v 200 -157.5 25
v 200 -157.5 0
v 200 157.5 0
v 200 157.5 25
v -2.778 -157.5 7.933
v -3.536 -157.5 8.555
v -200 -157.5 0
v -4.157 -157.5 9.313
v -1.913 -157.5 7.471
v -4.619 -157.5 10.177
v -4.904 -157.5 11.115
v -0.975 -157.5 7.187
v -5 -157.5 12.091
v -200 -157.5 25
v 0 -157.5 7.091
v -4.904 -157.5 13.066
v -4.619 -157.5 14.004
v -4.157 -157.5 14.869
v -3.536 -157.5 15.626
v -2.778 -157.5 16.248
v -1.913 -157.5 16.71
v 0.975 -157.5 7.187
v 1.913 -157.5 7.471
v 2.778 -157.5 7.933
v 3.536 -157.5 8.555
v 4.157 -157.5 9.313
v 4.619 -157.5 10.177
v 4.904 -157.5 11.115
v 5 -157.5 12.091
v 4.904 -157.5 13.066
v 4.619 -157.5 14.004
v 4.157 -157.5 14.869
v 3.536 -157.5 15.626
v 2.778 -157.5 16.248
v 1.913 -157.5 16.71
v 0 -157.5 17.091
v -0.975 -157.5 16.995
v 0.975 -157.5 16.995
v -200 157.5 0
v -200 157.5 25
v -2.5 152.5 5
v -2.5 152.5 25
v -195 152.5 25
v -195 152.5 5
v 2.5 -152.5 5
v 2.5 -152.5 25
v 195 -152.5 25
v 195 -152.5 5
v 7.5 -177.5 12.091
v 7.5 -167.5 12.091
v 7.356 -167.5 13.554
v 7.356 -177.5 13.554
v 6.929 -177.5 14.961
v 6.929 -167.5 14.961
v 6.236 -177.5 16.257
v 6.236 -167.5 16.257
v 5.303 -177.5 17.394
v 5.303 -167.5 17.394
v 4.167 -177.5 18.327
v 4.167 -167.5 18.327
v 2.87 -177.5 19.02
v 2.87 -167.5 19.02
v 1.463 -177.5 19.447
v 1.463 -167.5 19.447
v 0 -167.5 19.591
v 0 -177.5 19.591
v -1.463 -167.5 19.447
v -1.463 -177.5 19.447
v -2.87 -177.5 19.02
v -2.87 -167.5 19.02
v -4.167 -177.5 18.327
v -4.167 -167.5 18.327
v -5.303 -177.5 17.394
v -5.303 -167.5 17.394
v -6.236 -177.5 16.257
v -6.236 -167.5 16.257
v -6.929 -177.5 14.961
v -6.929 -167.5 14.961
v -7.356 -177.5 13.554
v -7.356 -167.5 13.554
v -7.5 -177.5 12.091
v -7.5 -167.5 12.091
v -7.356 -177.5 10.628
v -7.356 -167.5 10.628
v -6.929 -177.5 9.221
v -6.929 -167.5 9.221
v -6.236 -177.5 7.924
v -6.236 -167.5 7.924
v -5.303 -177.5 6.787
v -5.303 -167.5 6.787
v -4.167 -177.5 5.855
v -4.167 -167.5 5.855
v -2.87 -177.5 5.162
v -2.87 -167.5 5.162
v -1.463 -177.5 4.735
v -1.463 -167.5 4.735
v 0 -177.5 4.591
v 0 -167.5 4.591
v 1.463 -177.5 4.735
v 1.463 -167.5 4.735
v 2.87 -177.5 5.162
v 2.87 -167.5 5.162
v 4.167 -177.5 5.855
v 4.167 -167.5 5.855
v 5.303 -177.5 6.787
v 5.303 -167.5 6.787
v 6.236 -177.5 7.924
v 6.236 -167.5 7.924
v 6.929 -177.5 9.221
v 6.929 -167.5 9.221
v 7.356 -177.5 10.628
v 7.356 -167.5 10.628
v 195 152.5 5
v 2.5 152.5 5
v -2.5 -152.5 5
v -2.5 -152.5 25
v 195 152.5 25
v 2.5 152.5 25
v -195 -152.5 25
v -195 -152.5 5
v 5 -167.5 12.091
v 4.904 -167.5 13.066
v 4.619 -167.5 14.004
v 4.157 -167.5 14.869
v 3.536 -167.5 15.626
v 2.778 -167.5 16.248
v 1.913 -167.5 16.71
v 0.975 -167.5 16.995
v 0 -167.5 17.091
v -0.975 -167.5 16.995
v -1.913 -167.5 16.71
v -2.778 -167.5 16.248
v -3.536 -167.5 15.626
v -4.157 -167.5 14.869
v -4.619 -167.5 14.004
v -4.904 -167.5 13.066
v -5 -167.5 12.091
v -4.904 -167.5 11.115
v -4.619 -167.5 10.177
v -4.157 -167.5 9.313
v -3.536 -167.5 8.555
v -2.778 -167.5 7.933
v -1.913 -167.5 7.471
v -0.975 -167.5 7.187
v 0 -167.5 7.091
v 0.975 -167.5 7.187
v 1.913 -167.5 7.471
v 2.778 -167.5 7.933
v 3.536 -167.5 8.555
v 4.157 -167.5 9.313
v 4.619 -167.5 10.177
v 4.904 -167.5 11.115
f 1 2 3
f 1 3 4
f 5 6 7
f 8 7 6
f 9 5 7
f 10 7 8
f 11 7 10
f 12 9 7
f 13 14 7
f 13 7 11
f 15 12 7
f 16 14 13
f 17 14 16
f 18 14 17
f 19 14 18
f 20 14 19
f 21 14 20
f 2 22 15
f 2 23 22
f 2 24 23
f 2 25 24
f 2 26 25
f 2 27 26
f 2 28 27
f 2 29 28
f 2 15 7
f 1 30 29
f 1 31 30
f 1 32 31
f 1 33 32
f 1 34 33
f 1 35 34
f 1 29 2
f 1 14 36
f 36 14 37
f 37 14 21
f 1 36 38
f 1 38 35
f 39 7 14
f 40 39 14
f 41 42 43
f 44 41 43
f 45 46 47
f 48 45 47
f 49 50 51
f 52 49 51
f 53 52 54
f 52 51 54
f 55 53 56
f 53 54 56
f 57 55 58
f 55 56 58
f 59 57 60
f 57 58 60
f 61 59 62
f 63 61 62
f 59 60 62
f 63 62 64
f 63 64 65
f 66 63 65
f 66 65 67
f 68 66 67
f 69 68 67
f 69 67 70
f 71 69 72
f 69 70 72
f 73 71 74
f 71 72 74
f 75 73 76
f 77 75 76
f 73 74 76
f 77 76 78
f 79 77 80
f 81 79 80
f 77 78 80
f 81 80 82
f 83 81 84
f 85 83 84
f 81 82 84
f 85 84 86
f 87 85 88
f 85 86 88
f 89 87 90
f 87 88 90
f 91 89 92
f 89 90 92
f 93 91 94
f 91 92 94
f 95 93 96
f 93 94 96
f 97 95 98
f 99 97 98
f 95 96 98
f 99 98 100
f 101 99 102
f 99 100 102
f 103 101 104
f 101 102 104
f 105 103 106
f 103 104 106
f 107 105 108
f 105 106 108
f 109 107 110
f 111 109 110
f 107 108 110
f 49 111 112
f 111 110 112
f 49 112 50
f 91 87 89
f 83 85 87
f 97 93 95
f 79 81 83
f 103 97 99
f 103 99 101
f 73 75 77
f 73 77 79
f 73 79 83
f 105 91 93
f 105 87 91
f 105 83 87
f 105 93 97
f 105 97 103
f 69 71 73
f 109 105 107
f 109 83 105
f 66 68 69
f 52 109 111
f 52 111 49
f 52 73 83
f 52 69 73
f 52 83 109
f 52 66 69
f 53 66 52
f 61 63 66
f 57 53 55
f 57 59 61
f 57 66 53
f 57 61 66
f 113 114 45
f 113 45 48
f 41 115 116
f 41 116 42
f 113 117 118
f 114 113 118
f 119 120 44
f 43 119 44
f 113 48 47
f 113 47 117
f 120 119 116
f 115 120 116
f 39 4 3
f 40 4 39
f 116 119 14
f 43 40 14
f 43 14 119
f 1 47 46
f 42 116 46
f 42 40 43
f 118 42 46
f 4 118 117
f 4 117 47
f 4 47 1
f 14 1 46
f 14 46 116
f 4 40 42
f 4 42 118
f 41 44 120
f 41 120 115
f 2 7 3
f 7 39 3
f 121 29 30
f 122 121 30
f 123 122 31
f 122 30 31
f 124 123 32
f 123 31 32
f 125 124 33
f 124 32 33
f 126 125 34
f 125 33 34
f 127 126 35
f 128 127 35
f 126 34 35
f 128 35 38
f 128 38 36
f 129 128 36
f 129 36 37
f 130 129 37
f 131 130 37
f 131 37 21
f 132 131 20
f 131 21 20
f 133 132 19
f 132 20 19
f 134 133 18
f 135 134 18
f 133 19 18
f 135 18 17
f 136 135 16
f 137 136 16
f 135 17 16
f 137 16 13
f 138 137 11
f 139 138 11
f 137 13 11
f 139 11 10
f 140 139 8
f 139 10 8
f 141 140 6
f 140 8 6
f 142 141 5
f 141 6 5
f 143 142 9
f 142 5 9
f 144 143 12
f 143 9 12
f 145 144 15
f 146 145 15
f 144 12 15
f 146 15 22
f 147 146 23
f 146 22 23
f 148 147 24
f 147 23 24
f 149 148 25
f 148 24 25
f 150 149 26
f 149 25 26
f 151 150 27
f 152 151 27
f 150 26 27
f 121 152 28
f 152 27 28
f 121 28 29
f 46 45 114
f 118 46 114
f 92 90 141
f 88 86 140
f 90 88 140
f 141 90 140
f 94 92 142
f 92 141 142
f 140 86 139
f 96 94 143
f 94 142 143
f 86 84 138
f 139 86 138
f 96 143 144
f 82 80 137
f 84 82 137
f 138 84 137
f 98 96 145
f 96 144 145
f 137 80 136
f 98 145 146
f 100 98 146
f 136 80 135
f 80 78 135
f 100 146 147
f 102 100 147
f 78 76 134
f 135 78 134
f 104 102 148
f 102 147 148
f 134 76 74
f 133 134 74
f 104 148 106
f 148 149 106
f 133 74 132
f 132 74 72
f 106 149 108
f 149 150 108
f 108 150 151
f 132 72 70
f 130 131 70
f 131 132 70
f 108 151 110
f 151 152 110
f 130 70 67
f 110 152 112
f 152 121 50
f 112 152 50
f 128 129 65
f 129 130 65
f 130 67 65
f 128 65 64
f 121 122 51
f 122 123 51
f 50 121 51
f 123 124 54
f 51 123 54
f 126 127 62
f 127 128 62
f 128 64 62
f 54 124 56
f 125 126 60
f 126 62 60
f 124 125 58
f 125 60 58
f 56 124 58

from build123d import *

# Parameters (mm, degrees)
F0_W      = 38.3663107641
F0_H      = 42.2096475959
F1_DEPTH  = 0.6858
F3_W      = 400
F3_H      = 305
F4_DEPTH  = 5
F5_W      = 5
F5_H      = 305
F6_DEPTH  = 20
F7_W      = 5
F7_H      = 305
F8_DEPTH  = 20
F9_W      = 400
F9_H      = 25
F10_DEPTH = 5
F11_W     = 5
F11_H     = 305
F12_DEPTH = 20
F13_W     = 400
F13_H     = 25
F14_DEPTH = 5
F15_R     = 5
F16_DEPTH = 10
F17_R     = 7.5
F17_R_2   = 5
F18_DEPTH = 10


with BuildPart() as f1:
    # F0 (on Top) → F1 (new body)
    with BuildSketch(Plane.XY):
        with Locations((-14.0401979443, 21.1048237979)):
            Rectangle(F0_W, F0_H)
    extrude(amount=F1_DEPTH)


with BuildPart() as f4:
    # F3 (on Top) → F4 (new body)
    with BuildSketch(Plane.XY):
        Rectangle(F3_W, F3_H)
    extrude(amount=F4_DEPTH)

    # F5 (on face) → F6 (join)
    with BuildSketch(Plane.XY.offset(5)):
        with Locations((-197.5, 0)):
            Rectangle(F5_W, F5_H)
    extrude(amount=F6_DEPTH)

    # F7 (on face) → F8 (join)
    with BuildSketch(Plane.XY.offset(5)):
        with Locations((197.5, 0)):
            Rectangle(F7_W, F7_H)
    extrude(amount=F8_DEPTH)

    # F9 (on face) → F10 (join)
    with BuildSketch(Plane(origin=(0, 152.5, 0), x_dir=(-1, 0, 0), z_dir=(0, 1, 0))):
        with Locations((0, 12.5)):
            Rectangle(F9_W, F9_H)
    extrude(amount=F10_DEPTH)

    # F11 (on face) → F12 (join)
    with BuildSketch(Plane.XY.offset(5)):
        Rectangle(F11_W, F11_H)
    extrude(amount=F12_DEPTH)

    # F13 (on face) → F14 (join)
    with BuildSketch(Plane.XZ.offset(152.5)):
        with Locations((0, 12.5)):
            Rectangle(F13_W, F13_H)
    extrude(amount=F14_DEPTH)

    # F15 (on face) → F16 (join)
    with BuildSketch(Plane.XZ.offset(157.5)):
        with Locations((0, 12.090690434)):
            Circle(F15_R)
    extrude(amount=F16_DEPTH)

    # F17 (on face) → F18 (join)
    with BuildSketch(Plane.XZ.offset(167.5)):
        with Locations((0, 12.090690434)):
            Circle(F17_R)
        with Locations((0, 12.090690434)):
            Circle(F17_R_2, mode=Mode.SUBTRACT)
        with Locations((0, 12.090690434)):
            Circle(F17_R_2)
    extrude(amount=F18_DEPTH)


solid = f4.part
